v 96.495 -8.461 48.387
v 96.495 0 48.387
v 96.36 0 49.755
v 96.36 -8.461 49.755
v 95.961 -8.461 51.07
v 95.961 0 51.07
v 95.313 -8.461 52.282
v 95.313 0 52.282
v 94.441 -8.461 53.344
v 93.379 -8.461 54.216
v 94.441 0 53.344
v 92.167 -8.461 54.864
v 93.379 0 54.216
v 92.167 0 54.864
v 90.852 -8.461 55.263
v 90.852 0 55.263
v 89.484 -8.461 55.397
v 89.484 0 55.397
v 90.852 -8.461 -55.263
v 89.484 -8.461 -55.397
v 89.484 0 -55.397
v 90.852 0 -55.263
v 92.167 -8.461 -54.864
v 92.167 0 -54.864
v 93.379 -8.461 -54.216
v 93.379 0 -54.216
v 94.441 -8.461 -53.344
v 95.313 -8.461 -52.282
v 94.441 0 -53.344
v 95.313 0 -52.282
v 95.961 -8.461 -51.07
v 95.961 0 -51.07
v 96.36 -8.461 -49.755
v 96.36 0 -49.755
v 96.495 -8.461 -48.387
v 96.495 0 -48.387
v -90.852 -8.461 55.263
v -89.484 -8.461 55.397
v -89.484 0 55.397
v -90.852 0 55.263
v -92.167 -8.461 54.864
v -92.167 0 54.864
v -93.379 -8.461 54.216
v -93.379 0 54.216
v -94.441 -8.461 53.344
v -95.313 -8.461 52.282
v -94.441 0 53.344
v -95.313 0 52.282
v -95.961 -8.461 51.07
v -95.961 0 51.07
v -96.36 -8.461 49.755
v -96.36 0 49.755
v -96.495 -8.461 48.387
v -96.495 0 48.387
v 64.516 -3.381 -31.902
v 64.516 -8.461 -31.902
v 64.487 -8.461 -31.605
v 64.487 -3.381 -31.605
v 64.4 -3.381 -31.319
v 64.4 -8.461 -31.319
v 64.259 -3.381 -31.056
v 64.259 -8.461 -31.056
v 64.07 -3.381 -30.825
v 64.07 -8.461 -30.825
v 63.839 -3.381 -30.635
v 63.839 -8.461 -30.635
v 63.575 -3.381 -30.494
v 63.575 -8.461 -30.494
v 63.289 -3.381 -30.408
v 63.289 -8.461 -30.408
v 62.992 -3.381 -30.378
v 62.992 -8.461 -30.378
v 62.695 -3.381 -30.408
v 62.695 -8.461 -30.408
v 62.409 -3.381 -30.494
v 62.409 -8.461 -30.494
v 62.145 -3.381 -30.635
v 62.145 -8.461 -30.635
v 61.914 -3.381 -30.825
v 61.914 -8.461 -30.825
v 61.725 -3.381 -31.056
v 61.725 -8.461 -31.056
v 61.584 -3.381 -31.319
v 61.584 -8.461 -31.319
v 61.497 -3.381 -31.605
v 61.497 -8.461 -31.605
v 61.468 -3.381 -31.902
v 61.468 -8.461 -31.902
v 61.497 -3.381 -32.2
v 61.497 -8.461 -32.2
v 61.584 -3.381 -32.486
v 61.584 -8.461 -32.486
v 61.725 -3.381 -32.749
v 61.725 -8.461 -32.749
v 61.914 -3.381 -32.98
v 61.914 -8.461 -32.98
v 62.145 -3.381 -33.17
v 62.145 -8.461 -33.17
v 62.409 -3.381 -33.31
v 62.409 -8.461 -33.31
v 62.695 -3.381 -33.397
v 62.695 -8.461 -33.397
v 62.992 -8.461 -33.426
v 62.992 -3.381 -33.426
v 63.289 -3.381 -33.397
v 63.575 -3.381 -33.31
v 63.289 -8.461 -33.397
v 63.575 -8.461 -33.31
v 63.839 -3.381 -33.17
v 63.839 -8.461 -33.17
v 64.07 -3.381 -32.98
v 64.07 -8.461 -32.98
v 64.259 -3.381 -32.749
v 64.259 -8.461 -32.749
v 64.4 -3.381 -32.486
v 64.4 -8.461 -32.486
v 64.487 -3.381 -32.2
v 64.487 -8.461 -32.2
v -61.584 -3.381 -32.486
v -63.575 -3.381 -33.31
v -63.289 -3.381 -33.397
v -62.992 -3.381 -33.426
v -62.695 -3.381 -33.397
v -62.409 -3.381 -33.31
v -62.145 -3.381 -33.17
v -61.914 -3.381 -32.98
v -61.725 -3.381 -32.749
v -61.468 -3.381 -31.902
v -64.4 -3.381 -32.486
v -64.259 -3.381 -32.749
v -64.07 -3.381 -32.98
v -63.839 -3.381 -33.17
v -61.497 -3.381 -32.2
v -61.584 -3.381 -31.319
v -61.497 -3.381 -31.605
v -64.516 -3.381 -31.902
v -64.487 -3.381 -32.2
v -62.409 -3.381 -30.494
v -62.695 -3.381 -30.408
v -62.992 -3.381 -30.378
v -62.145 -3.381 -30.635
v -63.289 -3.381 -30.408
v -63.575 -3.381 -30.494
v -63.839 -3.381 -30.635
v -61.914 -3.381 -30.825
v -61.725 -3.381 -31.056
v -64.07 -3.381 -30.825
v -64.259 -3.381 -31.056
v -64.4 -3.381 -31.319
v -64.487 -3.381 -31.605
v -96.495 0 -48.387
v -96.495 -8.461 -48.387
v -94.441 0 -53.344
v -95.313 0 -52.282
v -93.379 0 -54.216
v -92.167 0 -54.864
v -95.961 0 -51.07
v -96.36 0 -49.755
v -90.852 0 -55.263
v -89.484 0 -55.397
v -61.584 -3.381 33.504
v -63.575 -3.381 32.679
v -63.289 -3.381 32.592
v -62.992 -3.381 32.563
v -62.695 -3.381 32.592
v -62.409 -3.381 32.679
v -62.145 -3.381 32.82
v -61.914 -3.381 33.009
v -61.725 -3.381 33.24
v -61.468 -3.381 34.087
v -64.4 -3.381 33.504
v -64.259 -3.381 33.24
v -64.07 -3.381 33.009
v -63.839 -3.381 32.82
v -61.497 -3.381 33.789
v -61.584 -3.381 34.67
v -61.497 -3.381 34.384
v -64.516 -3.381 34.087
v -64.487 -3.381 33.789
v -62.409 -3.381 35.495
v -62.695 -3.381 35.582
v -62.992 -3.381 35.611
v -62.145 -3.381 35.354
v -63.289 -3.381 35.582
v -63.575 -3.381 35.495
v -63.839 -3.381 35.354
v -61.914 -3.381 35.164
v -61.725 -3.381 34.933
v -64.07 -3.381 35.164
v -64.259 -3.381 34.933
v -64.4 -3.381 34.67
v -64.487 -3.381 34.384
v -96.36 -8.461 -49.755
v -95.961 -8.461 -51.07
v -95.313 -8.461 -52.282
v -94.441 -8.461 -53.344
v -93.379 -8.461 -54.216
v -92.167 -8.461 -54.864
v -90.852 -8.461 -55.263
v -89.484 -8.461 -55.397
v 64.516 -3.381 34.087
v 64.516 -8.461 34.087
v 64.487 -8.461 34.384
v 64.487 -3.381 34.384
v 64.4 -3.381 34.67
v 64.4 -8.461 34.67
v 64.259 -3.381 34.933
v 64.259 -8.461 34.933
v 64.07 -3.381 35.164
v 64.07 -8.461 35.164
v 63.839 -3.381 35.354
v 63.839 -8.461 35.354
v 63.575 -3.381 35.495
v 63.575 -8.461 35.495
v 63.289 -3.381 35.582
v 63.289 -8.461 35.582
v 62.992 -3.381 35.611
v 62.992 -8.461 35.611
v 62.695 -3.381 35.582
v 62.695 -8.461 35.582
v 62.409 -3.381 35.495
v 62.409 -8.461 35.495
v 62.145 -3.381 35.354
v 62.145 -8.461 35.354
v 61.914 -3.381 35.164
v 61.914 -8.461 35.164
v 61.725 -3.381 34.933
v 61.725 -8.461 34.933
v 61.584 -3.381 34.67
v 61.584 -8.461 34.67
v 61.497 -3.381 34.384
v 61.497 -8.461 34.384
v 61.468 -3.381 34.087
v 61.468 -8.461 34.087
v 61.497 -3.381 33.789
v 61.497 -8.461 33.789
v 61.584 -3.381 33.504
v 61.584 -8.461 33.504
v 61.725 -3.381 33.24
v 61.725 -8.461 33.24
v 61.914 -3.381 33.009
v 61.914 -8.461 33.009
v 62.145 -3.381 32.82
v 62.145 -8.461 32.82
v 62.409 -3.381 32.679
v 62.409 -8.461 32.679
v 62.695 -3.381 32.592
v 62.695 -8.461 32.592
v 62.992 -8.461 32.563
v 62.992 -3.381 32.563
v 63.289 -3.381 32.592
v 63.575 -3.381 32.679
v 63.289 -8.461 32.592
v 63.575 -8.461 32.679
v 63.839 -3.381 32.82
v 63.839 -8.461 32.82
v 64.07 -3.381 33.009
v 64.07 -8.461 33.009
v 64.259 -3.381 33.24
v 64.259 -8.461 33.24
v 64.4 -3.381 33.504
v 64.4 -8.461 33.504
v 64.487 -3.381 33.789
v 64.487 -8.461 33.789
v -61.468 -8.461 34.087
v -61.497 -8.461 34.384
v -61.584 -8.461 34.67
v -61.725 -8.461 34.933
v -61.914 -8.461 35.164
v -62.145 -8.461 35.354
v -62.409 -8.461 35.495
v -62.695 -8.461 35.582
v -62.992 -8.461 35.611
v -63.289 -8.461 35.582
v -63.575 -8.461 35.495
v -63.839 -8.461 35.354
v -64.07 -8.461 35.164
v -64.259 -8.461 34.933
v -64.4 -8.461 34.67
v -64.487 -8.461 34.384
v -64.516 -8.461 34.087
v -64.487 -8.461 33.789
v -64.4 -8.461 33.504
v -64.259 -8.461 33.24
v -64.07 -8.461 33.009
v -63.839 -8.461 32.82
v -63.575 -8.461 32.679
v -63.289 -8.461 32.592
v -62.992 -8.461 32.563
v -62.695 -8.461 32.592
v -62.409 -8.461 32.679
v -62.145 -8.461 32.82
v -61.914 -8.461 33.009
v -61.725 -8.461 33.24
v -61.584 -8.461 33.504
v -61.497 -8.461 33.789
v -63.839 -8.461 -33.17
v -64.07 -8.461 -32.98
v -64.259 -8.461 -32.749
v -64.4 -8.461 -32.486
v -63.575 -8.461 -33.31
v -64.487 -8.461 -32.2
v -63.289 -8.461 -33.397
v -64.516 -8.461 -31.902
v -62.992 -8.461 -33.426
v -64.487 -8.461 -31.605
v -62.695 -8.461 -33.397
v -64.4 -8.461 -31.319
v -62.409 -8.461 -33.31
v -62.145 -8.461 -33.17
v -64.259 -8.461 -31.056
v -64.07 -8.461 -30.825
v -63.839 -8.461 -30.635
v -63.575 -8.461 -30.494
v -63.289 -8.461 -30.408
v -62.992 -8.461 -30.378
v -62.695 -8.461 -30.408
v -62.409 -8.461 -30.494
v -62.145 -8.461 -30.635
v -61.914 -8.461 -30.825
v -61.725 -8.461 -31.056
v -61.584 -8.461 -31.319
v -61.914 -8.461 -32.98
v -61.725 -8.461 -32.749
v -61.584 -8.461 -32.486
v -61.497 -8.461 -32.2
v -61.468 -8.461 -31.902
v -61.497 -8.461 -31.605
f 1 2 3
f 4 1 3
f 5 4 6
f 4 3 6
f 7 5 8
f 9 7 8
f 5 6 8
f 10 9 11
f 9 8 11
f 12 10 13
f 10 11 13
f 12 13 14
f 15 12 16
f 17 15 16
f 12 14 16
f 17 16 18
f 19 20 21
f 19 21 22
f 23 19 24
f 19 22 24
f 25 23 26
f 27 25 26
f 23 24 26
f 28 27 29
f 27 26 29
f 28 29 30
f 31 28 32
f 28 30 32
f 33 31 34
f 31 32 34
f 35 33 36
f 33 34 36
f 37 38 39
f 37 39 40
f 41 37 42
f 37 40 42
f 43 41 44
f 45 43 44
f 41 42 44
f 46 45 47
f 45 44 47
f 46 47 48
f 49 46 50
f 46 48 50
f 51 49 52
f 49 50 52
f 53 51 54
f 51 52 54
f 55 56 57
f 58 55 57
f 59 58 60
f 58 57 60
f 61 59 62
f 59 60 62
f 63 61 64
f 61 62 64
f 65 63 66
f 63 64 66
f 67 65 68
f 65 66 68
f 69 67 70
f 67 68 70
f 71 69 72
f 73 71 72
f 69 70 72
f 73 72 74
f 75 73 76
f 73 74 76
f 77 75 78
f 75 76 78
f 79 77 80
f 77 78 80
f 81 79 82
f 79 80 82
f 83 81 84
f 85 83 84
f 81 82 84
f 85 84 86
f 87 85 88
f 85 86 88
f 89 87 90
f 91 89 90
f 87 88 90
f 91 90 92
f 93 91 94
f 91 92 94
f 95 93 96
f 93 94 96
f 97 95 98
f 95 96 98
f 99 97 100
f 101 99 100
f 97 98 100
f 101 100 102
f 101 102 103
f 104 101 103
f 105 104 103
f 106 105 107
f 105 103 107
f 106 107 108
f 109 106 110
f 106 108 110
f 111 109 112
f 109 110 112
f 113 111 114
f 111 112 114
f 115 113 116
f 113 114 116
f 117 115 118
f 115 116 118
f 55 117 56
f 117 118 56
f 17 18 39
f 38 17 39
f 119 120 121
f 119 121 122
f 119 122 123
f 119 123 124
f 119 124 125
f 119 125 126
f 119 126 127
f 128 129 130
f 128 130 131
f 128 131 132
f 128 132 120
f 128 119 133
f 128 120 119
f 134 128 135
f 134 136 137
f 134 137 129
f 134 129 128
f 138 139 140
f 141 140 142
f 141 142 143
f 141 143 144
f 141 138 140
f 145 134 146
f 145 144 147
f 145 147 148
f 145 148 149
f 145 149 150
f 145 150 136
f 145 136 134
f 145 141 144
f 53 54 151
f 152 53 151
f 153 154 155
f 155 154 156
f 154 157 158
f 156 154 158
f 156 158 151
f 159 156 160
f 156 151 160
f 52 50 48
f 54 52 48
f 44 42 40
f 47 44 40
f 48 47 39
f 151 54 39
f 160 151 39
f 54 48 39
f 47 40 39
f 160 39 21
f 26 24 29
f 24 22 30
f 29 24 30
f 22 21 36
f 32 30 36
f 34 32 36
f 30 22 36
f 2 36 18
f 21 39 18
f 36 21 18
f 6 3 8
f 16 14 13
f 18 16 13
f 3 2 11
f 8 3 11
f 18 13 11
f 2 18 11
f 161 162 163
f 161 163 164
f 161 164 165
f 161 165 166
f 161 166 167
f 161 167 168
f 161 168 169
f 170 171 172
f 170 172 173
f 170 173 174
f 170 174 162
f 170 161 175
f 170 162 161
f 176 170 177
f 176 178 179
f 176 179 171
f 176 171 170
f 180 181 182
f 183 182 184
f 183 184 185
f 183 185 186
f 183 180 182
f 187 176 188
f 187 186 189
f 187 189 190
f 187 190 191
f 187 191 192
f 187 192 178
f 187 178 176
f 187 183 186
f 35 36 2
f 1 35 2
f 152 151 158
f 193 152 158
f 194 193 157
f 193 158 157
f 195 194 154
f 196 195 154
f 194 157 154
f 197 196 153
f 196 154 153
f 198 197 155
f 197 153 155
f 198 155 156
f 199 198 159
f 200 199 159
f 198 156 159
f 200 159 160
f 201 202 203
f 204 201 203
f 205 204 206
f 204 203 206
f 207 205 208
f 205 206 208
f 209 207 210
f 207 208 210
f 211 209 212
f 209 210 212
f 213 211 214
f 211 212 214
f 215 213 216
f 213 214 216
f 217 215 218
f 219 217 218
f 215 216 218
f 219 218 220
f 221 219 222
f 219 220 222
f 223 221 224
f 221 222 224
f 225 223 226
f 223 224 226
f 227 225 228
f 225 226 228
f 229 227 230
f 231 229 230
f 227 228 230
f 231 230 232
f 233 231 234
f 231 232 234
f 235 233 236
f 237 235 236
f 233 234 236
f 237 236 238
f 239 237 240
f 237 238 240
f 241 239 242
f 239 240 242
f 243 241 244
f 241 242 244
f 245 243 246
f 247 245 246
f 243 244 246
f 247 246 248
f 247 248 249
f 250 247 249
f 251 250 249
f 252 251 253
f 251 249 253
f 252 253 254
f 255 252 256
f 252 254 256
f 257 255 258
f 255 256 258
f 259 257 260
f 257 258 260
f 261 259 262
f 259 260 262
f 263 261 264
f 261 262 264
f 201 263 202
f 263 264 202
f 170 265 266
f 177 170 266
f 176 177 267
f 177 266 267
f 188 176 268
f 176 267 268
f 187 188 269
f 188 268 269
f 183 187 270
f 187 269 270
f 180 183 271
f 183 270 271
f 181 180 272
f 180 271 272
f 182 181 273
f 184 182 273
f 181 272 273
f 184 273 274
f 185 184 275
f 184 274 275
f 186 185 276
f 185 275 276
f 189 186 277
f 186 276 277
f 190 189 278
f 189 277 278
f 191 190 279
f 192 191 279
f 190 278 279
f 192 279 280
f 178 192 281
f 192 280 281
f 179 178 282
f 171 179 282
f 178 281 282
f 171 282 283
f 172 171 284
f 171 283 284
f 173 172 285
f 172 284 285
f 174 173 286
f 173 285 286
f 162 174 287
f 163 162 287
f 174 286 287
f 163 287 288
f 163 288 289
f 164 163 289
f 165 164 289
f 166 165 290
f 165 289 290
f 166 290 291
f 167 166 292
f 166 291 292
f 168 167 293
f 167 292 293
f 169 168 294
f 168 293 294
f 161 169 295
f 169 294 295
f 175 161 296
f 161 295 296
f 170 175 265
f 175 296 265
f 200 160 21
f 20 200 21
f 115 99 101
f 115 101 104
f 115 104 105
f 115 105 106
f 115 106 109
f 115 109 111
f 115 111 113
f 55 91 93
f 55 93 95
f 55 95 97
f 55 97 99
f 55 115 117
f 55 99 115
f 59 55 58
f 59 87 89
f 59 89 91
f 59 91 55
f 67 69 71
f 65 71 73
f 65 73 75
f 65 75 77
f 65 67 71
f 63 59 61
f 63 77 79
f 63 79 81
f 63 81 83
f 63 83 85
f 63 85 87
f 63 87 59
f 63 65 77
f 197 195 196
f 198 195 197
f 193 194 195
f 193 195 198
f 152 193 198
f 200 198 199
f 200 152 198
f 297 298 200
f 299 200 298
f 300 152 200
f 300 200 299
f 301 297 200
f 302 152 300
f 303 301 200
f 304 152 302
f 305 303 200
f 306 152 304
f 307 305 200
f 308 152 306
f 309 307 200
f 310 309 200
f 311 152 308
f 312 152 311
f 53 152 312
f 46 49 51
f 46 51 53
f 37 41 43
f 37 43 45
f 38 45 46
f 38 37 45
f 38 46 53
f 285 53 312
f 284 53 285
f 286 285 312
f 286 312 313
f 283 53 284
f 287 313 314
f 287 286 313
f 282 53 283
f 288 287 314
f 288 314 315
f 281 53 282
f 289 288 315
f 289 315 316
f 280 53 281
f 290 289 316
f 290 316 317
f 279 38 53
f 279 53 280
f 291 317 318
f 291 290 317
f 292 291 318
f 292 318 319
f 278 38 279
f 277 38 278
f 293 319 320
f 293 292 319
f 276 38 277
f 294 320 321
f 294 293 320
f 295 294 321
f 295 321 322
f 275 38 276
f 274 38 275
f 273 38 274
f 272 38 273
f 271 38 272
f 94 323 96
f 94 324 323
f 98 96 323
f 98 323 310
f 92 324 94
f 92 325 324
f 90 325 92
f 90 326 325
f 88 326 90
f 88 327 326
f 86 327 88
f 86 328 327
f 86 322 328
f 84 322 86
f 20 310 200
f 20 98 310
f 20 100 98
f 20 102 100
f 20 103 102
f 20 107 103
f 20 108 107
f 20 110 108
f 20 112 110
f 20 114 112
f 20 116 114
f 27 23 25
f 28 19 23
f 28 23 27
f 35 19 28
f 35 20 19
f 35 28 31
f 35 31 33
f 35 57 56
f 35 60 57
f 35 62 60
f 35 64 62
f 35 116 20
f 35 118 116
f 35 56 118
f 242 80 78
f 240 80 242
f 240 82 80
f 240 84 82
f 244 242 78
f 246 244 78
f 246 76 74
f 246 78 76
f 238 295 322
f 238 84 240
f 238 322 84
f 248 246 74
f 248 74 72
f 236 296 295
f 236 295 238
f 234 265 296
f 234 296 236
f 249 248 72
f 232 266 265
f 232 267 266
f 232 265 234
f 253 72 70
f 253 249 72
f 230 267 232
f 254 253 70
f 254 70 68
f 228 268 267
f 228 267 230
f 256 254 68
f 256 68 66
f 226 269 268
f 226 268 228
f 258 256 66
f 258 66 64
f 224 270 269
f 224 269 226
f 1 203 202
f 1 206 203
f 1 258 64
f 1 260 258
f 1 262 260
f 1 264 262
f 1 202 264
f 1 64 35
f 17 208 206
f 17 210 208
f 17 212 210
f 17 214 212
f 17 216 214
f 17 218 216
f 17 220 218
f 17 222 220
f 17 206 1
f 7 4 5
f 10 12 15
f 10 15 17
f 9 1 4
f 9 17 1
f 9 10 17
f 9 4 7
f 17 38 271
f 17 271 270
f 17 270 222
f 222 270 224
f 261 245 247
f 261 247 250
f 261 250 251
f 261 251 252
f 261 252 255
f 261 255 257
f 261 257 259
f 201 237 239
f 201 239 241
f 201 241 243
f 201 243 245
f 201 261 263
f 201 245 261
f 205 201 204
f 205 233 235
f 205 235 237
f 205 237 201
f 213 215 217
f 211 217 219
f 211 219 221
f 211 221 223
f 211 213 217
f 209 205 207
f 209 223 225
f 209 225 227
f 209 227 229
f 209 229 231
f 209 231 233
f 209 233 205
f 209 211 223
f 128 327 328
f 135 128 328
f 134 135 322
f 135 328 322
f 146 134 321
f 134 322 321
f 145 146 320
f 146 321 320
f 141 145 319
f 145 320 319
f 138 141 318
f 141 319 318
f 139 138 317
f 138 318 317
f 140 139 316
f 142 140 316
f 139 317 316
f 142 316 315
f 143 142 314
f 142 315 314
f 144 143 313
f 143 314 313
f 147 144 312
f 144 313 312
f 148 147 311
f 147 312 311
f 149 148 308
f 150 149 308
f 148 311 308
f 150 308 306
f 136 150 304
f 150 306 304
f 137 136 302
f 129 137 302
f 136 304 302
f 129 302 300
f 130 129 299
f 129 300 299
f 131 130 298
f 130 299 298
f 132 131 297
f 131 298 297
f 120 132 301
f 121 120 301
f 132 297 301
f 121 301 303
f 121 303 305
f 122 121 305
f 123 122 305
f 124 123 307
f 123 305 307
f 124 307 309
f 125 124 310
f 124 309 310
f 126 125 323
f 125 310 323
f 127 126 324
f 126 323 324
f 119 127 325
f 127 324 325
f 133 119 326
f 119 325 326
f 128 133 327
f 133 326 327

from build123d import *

# Parameters (mm, degrees)
F1_DEPTH = 8.46074
F2_R     = 1.524
F3_DEPTH = 5.08


with BuildPart() as f1:
    # F0 (on Front) → F1 (new body)
    with BuildSketch(Plane.XZ):
        with BuildLine():
            ThreePointArc((96.4946, 48.387), (94.441301, 53.344101), (89.4842, 55.3974))
            Line((89.4842, 55.3974), (-89.4842, 55.3974))
            ThreePointArc((-89.4842, 55.3974), (-94.441301, 53.344101), (-96.4946, 48.387))
            Line((-96.4946, 48.387), (-96.4946, -48.387))
            ThreePointArc((-96.4946, -48.387), (-94.441301, -53.344101), (-89.4842, -55.3974))
            Line((-89.4842, -55.3974), (89.4842, -55.3974))
            ThreePointArc((89.4842, -55.3974), (94.441301, -53.344101), (96.4946, -48.387))
            Line((96.4946, -48.387), (96.4946, 48.387))
        make_face()
    extrude(amount=F1_DEPTH)

    # F2 (on face) → F3 (cut)
    with BuildSketch(Plane.XZ.offset(8.46074)):
        with Locations((-62.992, 34.0868)):
            Circle(F2_R)
        with Locations((62.992, 34.0868)):
            Circle(F2_R)
        with Locations((62.992, -31.9024)):
            Circle(F2_R)
        with Locations((-62.992, -31.9024)):
            Circle(F2_R)
    extrude(amount=-F3_DEPTH, mode=Mode.SUBTRACT)


solid = f1.part
